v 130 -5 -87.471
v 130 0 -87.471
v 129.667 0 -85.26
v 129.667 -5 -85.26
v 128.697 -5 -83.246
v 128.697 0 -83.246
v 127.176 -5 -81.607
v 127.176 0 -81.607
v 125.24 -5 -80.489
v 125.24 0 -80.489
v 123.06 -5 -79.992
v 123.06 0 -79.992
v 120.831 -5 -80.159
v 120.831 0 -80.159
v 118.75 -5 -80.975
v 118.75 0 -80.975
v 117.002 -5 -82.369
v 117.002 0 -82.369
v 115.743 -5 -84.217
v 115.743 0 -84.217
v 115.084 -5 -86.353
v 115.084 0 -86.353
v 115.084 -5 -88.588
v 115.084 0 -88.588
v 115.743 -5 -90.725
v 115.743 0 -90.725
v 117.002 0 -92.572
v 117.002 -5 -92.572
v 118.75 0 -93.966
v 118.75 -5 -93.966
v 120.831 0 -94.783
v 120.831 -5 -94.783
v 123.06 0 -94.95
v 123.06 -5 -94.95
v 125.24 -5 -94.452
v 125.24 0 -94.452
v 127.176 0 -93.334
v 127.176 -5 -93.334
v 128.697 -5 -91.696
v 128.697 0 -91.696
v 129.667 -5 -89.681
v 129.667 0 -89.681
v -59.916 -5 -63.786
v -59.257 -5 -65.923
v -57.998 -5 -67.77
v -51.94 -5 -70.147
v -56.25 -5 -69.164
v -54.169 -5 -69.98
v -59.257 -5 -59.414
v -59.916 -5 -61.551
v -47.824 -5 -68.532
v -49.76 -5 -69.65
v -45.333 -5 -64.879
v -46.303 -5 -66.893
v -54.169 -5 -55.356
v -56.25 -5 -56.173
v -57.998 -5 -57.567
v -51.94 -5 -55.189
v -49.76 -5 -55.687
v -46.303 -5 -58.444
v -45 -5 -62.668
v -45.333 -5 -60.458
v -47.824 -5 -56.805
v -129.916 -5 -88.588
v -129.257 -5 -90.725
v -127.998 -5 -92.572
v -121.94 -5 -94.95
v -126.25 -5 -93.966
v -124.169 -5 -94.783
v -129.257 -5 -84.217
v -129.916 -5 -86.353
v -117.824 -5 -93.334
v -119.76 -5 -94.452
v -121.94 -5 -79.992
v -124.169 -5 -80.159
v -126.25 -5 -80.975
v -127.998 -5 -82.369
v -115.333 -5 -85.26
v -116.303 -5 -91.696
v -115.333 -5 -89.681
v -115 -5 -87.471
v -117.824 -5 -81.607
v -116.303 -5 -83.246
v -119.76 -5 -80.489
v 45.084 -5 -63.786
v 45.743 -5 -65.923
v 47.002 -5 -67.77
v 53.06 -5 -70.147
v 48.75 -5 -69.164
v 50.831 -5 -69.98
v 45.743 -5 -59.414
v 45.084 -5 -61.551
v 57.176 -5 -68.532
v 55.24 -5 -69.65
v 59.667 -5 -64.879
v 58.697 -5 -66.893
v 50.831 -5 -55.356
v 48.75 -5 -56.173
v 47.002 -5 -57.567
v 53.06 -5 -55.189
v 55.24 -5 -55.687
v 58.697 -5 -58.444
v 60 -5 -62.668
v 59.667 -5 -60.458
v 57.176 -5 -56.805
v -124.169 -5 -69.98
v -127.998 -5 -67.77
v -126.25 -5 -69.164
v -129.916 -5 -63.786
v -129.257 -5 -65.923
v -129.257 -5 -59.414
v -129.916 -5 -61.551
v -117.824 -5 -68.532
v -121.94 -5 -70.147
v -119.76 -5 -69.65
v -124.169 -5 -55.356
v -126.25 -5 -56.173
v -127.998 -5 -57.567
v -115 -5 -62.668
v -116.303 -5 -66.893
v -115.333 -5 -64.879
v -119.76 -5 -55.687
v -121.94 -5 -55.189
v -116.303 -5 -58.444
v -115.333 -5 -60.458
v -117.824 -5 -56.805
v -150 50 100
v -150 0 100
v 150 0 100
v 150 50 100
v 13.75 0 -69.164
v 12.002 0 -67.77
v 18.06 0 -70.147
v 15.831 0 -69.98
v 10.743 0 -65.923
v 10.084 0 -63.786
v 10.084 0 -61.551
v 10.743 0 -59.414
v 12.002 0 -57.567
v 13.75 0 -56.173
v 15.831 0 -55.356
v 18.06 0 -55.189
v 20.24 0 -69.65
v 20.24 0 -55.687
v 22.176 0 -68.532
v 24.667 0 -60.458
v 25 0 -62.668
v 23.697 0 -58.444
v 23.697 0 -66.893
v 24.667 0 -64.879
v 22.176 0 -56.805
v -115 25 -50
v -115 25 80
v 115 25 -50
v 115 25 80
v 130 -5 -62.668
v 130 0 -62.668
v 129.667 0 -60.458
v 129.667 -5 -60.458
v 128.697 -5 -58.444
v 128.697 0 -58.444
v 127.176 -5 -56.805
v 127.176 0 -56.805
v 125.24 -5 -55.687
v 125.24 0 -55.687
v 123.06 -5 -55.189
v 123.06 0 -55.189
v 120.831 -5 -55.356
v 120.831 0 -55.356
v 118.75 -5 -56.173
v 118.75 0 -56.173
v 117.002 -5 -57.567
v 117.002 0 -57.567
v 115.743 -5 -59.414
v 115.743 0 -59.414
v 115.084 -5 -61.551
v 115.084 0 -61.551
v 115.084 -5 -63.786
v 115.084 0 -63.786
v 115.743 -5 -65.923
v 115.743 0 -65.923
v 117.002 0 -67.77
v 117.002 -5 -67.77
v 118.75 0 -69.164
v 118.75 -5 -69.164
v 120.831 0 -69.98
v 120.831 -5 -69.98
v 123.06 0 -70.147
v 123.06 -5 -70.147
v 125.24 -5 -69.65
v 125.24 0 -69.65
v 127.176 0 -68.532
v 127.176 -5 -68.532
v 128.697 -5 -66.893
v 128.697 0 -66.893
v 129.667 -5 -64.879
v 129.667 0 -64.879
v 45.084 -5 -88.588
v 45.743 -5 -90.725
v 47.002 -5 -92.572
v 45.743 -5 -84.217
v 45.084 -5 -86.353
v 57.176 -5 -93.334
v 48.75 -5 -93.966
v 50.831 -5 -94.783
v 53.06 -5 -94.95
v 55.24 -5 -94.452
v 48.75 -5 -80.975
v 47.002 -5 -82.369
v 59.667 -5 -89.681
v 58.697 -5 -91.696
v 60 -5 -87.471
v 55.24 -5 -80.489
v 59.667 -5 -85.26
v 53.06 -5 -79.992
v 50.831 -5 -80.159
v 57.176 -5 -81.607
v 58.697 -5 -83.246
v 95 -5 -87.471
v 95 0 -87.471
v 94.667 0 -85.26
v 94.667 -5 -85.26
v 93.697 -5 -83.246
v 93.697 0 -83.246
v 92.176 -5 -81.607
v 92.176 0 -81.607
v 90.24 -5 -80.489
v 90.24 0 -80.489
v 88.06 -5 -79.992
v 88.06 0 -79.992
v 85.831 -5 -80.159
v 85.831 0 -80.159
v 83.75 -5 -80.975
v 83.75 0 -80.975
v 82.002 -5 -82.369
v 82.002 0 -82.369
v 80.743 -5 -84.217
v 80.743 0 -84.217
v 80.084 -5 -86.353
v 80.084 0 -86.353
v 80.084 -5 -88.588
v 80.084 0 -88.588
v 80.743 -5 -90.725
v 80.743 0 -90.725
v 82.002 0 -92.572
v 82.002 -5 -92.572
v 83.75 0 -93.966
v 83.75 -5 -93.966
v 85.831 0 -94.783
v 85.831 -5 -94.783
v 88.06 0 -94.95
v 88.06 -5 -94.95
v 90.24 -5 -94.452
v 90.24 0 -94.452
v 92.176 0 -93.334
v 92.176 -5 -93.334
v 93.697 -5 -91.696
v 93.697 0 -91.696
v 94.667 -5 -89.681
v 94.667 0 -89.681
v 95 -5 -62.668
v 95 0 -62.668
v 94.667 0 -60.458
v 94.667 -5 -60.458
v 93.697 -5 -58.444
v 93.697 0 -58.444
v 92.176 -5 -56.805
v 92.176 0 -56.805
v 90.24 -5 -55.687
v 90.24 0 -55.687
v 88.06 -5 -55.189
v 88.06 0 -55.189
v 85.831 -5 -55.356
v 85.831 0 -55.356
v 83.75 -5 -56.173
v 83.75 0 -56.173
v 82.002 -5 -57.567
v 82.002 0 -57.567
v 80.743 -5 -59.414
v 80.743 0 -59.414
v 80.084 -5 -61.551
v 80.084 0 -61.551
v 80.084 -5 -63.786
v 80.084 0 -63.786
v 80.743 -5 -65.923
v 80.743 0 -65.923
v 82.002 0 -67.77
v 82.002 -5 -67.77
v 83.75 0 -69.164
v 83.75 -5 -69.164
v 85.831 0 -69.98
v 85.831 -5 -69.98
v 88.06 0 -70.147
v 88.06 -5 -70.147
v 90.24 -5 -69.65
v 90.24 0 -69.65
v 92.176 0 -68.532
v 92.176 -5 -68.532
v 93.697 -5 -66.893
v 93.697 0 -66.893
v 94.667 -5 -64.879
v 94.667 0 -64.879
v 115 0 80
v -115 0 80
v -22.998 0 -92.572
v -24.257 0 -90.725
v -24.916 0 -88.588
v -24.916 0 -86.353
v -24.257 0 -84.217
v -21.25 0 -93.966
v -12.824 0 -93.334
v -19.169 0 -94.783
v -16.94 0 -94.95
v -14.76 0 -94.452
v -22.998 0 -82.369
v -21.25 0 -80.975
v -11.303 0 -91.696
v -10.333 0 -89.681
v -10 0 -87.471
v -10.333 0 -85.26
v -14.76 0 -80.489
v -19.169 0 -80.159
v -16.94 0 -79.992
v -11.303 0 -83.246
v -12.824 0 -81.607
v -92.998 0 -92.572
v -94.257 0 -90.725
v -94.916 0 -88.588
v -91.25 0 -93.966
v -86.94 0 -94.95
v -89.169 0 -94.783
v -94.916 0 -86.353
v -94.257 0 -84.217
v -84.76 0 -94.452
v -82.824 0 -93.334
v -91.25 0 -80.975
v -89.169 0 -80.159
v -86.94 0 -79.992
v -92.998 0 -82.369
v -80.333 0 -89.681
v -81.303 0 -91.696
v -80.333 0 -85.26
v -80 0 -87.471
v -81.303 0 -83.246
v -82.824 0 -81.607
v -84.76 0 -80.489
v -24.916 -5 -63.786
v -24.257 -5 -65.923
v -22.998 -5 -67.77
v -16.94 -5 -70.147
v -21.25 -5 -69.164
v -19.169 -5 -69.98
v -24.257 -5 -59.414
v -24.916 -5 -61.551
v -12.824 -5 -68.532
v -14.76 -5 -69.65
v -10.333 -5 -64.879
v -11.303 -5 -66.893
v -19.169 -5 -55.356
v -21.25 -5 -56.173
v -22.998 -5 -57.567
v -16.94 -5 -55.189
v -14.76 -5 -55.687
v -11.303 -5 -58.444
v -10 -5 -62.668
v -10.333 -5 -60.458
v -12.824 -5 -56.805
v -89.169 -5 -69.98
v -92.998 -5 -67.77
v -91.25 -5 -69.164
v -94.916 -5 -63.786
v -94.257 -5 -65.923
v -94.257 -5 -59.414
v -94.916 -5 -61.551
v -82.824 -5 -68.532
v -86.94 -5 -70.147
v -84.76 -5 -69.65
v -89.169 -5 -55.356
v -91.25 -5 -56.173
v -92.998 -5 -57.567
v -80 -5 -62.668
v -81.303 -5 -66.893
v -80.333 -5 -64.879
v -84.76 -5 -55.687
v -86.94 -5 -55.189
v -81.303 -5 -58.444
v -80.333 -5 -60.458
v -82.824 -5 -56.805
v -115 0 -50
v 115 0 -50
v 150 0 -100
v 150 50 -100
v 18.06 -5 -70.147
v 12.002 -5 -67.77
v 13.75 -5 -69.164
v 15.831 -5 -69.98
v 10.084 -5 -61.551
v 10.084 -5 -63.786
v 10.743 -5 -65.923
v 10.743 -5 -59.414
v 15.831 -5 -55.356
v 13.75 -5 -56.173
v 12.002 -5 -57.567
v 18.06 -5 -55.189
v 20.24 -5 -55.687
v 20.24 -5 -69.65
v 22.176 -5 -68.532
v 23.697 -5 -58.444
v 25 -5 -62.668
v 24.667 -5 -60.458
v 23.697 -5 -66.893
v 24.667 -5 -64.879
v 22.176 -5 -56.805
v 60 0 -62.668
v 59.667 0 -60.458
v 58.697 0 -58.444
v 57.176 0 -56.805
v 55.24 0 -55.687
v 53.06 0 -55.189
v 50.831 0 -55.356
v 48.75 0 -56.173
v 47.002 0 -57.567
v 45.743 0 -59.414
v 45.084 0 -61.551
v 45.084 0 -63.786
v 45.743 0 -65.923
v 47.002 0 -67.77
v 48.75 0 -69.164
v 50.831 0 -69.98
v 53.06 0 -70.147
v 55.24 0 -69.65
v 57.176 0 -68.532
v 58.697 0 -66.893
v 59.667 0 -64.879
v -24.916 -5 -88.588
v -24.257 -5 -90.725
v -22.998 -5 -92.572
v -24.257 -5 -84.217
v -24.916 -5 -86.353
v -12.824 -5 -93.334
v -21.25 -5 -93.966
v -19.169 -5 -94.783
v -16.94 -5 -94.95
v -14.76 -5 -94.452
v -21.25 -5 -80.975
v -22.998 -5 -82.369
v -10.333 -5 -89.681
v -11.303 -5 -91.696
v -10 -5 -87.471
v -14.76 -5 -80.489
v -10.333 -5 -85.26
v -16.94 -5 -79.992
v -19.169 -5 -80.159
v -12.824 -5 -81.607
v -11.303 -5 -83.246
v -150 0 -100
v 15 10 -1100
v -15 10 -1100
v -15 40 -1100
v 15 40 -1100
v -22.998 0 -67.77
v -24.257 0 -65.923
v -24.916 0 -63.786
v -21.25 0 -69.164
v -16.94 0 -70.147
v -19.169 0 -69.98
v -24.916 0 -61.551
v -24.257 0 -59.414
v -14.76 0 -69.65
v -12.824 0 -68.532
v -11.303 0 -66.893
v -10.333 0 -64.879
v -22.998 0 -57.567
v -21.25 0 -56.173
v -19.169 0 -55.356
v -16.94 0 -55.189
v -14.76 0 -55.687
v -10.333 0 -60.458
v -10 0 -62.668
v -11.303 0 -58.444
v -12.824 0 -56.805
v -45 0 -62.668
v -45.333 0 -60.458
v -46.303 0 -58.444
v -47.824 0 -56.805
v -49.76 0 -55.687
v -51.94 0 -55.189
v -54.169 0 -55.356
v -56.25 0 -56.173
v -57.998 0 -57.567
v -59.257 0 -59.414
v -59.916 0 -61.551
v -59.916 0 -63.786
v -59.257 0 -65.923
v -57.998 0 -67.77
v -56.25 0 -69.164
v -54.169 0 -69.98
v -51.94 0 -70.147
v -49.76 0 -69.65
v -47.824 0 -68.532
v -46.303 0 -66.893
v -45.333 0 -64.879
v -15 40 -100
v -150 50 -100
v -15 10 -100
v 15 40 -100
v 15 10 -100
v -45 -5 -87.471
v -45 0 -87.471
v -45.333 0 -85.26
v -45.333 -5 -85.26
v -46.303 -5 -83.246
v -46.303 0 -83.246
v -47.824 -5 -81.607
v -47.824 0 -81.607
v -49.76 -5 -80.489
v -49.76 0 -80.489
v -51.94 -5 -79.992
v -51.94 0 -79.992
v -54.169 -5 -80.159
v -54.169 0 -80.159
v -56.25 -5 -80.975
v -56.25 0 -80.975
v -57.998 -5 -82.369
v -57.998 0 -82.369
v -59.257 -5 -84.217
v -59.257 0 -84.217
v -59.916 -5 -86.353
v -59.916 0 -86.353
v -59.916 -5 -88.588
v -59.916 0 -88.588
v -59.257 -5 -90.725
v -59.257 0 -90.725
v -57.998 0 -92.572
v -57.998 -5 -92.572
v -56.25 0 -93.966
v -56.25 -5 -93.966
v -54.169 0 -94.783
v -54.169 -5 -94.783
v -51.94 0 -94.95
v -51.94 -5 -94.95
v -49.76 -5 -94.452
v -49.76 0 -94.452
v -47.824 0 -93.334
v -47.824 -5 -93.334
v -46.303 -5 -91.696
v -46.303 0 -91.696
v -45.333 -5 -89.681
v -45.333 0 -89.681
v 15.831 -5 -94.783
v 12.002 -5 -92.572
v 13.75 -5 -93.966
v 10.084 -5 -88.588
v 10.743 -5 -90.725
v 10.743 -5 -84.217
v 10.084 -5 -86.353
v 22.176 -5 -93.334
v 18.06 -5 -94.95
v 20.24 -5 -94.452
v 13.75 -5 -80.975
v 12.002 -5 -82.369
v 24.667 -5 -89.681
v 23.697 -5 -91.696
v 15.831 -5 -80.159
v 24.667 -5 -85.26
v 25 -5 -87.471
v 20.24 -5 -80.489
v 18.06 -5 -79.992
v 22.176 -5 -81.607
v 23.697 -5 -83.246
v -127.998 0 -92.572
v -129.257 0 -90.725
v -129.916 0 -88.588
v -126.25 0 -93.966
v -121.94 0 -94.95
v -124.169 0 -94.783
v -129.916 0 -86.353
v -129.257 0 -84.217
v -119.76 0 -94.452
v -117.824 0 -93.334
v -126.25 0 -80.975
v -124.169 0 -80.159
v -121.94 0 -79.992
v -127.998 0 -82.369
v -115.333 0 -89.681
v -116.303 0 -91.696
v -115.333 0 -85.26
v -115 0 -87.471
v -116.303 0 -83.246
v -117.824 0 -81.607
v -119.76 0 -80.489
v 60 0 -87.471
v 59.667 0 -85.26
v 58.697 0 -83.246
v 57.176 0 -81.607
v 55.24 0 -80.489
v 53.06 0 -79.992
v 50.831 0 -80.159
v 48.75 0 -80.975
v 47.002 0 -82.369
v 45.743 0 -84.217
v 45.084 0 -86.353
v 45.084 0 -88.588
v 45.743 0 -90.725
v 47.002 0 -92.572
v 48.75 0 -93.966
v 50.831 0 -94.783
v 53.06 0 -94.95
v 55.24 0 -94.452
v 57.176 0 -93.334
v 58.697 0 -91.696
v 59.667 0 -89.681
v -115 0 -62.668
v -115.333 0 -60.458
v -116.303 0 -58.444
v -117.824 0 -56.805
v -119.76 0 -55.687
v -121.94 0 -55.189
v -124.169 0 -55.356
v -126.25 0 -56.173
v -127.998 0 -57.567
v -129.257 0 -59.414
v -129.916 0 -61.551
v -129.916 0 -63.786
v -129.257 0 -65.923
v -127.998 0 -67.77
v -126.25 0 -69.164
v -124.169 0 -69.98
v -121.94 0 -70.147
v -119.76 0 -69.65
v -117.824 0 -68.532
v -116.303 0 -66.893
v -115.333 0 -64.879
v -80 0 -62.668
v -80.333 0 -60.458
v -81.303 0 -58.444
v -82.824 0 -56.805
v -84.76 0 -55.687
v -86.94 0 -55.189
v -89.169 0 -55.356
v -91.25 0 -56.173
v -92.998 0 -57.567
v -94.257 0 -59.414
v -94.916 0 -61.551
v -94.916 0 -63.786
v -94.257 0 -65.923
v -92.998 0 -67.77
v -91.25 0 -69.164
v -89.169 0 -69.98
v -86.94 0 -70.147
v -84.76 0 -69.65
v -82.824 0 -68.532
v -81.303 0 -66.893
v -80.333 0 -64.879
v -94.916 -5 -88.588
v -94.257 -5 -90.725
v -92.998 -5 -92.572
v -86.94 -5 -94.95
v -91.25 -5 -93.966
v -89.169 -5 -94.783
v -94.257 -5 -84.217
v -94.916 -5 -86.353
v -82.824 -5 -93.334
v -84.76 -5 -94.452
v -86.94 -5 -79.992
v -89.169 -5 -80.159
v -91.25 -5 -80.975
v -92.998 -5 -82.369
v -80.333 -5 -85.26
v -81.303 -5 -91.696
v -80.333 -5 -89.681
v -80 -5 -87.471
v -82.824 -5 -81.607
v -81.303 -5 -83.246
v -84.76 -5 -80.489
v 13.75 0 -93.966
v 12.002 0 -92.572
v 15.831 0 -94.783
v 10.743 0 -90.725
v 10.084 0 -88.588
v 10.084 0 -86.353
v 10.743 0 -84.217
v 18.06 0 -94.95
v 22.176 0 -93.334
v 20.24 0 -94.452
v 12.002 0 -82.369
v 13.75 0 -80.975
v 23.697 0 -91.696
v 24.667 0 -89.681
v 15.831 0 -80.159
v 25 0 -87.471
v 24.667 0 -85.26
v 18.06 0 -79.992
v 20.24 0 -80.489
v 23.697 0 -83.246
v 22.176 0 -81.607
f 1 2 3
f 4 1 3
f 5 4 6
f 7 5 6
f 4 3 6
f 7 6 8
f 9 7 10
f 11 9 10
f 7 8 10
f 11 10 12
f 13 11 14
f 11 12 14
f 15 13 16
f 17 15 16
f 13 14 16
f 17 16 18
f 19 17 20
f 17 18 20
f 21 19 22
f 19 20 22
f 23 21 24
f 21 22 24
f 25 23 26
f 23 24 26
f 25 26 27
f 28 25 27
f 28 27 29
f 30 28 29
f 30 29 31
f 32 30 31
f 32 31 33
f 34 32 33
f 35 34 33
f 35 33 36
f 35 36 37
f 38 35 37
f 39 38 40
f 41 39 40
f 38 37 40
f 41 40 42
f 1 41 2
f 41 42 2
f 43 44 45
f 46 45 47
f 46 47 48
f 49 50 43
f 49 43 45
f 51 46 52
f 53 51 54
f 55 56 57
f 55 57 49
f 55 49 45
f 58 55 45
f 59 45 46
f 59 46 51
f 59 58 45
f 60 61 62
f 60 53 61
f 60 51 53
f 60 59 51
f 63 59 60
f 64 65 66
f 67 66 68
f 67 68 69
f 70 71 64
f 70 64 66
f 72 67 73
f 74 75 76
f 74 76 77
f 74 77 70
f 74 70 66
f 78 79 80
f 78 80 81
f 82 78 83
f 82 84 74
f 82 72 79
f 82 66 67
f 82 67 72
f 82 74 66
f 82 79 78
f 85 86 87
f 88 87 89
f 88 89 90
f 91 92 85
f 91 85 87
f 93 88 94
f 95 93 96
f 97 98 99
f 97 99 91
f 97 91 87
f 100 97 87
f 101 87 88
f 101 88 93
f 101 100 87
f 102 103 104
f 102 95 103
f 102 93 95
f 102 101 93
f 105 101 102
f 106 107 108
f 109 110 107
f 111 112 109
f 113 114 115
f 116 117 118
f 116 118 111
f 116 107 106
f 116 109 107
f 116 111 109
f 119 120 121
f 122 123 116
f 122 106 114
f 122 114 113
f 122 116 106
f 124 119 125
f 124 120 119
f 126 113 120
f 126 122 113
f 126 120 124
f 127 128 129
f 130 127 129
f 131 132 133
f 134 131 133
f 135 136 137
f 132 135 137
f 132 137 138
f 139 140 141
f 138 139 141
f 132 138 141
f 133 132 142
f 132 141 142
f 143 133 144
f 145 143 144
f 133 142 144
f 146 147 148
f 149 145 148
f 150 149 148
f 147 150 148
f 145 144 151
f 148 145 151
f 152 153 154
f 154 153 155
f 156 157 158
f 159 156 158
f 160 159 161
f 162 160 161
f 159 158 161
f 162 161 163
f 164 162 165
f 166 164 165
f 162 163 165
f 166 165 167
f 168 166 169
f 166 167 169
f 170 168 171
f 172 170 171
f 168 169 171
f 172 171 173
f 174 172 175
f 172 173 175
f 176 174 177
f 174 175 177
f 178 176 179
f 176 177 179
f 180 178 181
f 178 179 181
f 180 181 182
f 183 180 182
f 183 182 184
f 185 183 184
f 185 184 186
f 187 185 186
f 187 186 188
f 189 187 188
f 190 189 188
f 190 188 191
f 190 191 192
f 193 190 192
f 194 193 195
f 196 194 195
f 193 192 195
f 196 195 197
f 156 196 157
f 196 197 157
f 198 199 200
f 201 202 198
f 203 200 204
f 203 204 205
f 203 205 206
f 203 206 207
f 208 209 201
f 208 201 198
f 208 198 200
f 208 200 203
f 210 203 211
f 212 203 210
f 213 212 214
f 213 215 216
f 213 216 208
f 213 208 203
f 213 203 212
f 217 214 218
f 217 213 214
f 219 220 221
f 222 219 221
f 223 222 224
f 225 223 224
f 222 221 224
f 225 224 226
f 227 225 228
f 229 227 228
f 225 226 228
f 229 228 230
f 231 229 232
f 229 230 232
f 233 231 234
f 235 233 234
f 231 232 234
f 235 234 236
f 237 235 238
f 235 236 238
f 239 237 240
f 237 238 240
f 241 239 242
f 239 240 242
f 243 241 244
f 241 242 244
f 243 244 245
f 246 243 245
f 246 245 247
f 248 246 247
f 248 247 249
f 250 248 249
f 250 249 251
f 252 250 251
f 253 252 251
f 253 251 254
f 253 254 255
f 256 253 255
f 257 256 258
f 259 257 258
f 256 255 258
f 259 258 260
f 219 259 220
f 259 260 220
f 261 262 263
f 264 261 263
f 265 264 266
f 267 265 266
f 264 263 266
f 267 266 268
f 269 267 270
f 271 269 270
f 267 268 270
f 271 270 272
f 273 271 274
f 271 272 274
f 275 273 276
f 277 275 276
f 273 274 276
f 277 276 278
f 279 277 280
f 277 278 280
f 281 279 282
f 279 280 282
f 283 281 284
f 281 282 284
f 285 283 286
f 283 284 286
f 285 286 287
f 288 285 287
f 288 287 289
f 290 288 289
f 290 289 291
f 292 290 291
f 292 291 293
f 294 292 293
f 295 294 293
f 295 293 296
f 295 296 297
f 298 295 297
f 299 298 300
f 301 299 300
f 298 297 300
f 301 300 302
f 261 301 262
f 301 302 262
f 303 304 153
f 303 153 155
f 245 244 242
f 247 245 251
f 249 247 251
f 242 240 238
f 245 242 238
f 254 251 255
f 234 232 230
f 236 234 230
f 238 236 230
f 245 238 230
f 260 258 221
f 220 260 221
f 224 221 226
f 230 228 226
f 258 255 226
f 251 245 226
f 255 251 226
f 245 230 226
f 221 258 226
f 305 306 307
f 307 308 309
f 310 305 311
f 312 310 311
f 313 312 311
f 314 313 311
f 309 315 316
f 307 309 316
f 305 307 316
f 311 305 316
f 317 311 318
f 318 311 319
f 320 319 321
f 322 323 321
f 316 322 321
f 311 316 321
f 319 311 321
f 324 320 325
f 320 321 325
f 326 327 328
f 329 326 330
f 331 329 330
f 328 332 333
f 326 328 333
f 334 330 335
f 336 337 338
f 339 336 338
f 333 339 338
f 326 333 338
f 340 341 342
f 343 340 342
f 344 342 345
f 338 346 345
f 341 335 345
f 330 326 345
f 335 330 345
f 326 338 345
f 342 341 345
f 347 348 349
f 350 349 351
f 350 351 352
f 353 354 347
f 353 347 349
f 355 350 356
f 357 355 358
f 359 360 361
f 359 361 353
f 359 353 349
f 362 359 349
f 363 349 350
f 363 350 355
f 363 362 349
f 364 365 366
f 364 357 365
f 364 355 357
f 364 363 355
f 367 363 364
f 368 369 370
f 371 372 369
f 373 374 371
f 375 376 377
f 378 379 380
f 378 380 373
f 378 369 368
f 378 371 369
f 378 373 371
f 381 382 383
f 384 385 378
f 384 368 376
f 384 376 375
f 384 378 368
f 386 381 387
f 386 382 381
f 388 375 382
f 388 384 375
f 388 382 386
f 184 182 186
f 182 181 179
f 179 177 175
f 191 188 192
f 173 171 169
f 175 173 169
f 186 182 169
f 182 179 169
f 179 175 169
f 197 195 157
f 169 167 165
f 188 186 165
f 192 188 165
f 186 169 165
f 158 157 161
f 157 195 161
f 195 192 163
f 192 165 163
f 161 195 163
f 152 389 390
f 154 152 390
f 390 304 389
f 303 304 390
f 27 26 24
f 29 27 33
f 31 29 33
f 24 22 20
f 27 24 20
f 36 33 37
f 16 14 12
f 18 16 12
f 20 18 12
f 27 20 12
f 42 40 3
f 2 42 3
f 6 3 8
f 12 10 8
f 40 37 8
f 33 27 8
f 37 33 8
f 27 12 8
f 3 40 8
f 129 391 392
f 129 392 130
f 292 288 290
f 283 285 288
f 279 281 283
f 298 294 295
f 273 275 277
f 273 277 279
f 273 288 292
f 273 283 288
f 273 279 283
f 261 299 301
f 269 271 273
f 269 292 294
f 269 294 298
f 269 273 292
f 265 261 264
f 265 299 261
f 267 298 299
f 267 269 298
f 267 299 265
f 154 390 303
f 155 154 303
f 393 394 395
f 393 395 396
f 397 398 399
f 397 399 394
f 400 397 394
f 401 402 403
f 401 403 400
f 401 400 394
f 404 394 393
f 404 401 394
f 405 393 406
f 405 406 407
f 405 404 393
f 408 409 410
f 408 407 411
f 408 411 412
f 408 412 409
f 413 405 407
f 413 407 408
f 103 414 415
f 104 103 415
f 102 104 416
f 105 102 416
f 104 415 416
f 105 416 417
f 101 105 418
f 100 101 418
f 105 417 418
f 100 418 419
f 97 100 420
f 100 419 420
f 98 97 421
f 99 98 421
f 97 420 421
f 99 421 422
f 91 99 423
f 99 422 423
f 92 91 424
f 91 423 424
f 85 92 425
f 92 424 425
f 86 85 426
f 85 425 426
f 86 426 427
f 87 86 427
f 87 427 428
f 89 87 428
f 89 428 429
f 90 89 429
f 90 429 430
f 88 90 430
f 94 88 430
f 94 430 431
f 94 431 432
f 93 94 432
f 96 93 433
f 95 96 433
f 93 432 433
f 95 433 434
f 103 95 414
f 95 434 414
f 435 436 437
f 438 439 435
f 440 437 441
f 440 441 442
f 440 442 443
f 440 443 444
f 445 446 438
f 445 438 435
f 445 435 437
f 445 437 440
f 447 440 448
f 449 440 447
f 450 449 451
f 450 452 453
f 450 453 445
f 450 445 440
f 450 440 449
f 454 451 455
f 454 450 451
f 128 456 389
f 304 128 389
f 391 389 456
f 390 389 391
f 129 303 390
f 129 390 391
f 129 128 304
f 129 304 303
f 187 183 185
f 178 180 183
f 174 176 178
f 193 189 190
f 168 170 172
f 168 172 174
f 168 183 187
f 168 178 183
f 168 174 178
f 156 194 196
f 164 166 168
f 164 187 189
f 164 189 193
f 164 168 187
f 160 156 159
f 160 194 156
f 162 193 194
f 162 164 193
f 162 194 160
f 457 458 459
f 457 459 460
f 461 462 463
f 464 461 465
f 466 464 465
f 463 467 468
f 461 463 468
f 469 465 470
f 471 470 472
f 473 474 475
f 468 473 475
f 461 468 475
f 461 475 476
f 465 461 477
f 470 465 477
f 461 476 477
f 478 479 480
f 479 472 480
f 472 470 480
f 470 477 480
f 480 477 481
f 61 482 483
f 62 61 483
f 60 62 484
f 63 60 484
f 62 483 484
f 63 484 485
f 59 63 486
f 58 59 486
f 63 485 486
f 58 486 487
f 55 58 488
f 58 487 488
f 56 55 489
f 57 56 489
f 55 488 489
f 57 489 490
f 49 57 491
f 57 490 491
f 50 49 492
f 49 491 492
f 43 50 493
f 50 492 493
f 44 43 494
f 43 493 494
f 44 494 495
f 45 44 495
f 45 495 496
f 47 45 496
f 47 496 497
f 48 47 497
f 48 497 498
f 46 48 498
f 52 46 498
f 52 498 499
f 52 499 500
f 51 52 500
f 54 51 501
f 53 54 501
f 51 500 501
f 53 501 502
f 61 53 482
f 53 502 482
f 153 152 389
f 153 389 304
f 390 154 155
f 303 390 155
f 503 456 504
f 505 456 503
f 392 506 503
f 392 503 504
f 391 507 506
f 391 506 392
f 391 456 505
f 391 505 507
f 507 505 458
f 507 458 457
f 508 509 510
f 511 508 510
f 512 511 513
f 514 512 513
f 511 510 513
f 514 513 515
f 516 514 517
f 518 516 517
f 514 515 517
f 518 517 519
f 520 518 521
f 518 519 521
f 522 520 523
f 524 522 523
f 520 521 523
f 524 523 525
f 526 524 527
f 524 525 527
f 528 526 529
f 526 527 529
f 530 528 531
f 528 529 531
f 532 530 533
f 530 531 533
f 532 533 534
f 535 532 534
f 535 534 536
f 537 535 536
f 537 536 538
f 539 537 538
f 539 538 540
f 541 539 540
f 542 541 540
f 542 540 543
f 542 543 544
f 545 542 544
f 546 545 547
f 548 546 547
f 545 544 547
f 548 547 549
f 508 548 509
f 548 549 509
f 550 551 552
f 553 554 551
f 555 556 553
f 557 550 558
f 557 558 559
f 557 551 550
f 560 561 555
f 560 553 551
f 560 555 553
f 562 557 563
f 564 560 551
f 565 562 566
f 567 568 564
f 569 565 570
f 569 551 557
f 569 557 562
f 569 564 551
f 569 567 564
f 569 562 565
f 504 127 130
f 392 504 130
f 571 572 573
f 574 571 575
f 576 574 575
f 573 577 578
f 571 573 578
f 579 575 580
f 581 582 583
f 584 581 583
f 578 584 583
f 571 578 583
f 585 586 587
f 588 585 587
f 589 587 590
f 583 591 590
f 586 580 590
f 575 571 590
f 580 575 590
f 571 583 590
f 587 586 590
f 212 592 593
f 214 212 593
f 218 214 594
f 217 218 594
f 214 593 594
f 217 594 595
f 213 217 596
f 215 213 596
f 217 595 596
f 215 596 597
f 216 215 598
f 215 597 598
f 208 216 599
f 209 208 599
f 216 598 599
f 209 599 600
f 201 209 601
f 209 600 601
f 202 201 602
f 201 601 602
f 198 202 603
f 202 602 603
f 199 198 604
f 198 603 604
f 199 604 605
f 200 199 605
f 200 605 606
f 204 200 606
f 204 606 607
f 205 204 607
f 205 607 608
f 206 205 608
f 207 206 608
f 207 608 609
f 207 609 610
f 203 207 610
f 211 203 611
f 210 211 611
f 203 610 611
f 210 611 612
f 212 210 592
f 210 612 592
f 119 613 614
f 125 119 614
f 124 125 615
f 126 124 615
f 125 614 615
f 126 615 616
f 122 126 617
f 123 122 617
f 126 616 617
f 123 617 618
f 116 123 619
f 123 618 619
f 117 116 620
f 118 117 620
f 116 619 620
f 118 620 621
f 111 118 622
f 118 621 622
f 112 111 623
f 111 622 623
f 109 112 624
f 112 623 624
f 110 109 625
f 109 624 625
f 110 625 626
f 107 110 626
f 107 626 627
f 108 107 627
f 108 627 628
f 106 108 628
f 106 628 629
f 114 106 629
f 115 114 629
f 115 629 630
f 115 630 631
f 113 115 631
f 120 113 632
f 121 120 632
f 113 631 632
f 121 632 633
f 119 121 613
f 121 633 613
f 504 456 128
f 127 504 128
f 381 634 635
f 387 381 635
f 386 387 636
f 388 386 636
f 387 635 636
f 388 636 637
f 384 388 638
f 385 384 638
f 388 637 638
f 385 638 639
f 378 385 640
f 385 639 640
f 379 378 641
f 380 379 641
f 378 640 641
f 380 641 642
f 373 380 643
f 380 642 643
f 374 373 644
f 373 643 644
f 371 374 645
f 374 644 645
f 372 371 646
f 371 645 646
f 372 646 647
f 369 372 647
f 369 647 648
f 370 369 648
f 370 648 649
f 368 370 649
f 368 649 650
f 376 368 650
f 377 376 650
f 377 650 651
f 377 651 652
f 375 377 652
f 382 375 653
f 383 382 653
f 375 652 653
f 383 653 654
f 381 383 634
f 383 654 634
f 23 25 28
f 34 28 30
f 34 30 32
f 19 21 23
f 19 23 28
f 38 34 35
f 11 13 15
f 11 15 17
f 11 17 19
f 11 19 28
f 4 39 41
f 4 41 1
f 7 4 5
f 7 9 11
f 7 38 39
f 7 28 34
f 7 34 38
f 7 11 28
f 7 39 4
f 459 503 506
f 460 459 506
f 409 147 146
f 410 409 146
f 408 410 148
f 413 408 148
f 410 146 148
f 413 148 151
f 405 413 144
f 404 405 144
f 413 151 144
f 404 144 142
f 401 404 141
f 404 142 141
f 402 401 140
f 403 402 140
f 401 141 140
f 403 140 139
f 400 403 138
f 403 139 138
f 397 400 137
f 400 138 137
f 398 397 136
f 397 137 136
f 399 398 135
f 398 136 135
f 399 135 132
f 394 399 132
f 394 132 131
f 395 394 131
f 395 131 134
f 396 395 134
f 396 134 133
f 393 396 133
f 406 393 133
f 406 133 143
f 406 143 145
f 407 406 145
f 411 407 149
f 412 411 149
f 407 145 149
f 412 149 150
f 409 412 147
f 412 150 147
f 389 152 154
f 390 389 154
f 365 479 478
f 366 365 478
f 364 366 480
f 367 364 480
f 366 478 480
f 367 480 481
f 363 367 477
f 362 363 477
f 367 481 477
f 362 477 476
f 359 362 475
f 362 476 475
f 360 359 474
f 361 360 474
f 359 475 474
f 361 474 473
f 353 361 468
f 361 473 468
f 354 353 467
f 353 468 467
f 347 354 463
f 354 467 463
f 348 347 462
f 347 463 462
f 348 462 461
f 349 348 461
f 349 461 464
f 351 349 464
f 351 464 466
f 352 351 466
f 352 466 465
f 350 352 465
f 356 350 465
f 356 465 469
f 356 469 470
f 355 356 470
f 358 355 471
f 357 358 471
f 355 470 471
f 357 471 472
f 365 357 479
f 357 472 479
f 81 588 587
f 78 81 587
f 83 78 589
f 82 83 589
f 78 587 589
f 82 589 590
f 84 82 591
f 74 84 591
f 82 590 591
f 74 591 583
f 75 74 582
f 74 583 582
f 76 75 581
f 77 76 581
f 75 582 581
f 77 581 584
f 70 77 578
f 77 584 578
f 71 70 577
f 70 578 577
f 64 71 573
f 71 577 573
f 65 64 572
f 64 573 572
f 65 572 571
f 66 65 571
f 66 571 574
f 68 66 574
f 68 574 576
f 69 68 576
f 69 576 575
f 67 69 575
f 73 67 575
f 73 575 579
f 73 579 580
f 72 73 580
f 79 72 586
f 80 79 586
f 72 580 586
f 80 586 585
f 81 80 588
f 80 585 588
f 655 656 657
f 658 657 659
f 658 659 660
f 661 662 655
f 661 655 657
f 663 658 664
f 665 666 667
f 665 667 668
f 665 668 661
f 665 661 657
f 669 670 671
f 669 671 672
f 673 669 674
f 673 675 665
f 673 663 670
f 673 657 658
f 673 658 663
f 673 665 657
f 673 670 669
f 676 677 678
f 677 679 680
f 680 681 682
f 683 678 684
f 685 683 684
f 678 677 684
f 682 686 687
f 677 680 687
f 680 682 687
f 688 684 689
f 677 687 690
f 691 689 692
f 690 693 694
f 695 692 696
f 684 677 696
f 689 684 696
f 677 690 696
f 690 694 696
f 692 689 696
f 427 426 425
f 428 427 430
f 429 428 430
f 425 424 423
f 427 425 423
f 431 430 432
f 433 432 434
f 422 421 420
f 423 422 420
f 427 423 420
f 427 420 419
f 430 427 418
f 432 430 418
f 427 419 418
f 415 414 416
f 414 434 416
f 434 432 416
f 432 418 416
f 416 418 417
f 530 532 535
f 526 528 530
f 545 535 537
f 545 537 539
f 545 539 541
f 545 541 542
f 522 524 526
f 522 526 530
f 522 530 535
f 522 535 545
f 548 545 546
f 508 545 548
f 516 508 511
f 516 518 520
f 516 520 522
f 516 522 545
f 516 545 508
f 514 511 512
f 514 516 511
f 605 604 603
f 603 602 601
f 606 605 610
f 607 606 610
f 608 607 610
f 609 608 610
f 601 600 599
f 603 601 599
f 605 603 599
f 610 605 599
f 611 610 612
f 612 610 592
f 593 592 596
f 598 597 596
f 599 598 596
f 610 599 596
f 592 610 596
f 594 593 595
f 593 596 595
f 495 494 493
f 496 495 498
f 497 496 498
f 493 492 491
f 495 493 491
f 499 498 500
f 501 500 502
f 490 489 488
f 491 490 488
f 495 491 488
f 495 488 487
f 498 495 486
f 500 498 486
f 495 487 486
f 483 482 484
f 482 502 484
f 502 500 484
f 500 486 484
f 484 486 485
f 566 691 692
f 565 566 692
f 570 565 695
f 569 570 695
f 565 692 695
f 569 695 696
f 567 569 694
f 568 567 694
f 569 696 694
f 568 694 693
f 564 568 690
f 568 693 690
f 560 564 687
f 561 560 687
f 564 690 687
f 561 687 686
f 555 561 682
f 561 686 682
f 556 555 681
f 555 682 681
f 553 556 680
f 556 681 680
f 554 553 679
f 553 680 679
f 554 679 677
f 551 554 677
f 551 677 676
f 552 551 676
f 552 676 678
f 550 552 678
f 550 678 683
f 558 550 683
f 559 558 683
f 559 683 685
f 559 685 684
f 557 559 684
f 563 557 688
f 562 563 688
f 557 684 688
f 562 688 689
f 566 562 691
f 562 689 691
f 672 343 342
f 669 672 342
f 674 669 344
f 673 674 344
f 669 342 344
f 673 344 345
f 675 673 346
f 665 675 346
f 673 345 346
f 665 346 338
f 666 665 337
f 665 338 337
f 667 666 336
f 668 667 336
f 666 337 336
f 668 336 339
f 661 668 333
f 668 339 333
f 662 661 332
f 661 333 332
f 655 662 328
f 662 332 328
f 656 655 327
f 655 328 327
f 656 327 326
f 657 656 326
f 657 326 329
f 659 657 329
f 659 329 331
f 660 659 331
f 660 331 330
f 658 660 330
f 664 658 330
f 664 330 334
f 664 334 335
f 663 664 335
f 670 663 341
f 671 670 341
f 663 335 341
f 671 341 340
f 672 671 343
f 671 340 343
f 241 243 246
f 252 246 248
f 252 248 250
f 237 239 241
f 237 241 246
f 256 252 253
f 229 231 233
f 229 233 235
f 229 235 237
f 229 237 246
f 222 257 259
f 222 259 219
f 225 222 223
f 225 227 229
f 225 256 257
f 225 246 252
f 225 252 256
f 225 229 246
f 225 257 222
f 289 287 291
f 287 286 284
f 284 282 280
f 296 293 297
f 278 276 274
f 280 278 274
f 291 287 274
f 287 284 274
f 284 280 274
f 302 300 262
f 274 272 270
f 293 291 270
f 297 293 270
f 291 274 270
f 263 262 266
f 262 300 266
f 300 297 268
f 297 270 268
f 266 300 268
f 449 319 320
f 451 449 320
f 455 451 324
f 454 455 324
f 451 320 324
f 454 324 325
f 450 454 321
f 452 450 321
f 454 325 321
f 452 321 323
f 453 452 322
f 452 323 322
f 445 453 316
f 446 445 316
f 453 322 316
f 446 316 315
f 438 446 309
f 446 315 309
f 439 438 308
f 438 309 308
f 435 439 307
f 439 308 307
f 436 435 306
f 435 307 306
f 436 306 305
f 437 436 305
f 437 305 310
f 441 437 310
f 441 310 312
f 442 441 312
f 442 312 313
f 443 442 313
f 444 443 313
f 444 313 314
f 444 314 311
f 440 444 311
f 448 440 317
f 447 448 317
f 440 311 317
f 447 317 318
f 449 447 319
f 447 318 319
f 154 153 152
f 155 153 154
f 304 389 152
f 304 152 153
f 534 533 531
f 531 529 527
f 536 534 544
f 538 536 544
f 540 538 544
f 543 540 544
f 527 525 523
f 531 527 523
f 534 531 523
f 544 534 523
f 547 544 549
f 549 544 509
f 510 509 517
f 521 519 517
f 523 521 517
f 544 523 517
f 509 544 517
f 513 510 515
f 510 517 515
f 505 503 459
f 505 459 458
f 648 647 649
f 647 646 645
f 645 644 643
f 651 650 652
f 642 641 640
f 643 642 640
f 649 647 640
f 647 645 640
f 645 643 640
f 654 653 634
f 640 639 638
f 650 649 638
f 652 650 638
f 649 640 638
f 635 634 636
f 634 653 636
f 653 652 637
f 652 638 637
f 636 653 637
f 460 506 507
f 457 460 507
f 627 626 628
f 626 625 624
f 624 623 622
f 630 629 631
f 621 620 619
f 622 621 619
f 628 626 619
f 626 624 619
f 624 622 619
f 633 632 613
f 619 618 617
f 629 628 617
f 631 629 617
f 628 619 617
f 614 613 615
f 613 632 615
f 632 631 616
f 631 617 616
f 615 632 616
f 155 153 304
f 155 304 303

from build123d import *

# Parameters (mm, degrees)
F0_W     = 300
F0_H     = 200
F1_DEPTH = 50
F2_W     = 230
F2_H     = 130
F3_DEPTH = 25
F4_W     = 230
F4_H     = 130
F5_DEPTH = 25
F6_R     = 7.5
F7_DEPTH = 5
F8_W     = 30
F8_H     = 30
F9_DEPTH = 1000


with BuildPart() as f1:
    # F0 (on Front) → F1 (new body)
    with BuildSketch(Plane.XZ):
        Rectangle(F0_W, F0_H)
    extrude(amount=-F1_DEPTH)

    # F2 (on face) → F3 (cut)
    with BuildSketch(Plane.XZ):
        with Locations((0, 15)):
            Rectangle(F2_W, F2_H)
    extrude(amount=-F3_DEPTH, mode=Mode.SUBTRACT)

    # F8 (on face) → F9 (join)
    with BuildSketch(Plane(origin=(0, 0, -100), x_dir=(1, 0, 0), z_dir=(0, 0, -1))):
        with Locations((0, -25)):
            Rectangle(F8_W, F8_H)
    extrude(amount=F9_DEPTH)


with BuildPart() as f5:
    # F4 (on face) → F5 (new body)
    with BuildSketch(Plane.XZ.offset(-25)):
        with Locations((0, 15)):
            Rectangle(F4_W, F4_H)
    extrude(amount=F5_DEPTH)


with BuildPart() as f7:
    # F6 (on face) → F7 (new body)
    with BuildSketch(Plane.XZ):
        with Locations((-122.5, -62.6684501767)):
            Circle(F6_R)
    extrude(amount=F7_DEPTH)


with BuildPart() as f7b:
    # F6 (on face) → F7, piece 2 (new body)
    with BuildSketch(Plane.XZ):
        with Locations((-122.5, -87.4706730247)):
            Circle(F6_R)
    extrude(amount=F7_DEPTH)


with BuildPart() as f7c:
    # F6 (on face) → F7, piece 3 (new body)
    with BuildSketch(Plane.XZ):
        with Locations((-87.5, -62.6684501767)):
            Circle(F6_R)
    extrude(amount=F7_DEPTH)


with BuildPart() as f7d:
    # F6 (on face) → F7, piece 4 (new body)
    with BuildSketch(Plane.XZ):
        with Locations((-87.5, -87.4706730247)):
            Circle(F6_R)
    extrude(amount=F7_DEPTH)


with BuildPart() as f7e:
    # F6 (on face) → F7, piece 5 (new body)
    with BuildSketch(Plane.XZ):
        with Locations((-52.5, -62.6684501767)):
            Circle(F6_R)
    extrude(amount=F7_DEPTH)


with BuildPart() as f7f:
    # F6 (on face) → F7, piece 6 (new body)
    with BuildSketch(Plane.XZ):
        with Locations((-52.5, -87.4706730247)):
            Circle(F6_R)
    extrude(amount=F7_DEPTH)


with BuildPart() as f7g:
    # F6 (on face) → F7, piece 7 (new body)
    with BuildSketch(Plane.XZ):
        with Locations((-17.5, -62.6684501767)):
            Circle(F6_R)
    extrude(amount=F7_DEPTH)


with BuildPart() as f7h:
    # F6 (on face) → F7, piece 8 (new body)
    with BuildSketch(Plane.XZ):
        with Locations((-17.5, -87.4706730247)):
            Circle(F6_R)
    extrude(amount=F7_DEPTH)


with BuildPart() as f7i:
    # F6 (on face) → F7, piece 9 (new body)
    with BuildSketch(Plane.XZ):
        with Locations((17.5, -62.6684501767)):
            Circle(F6_R)
    extrude(amount=F7_DEPTH)


with BuildPart() as f7j:
    # F6 (on face) → F7, piece 10 (new body)
    with BuildSketch(Plane.XZ):
        with Locations((17.5, -87.4706730247)):
            Circle(F6_R)
    extrude(amount=F7_DEPTH)


with BuildPart() as f7k:
    # F6 (on face) → F7, piece 11 (new body)
    with BuildSketch(Plane.XZ):
        with Locations((52.5, -62.6684501767)):
            Circle(F6_R)
    extrude(amount=F7_DEPTH)


with BuildPart() as f7l:
    # F6 (on face) → F7, piece 12 (new body)
    with BuildSketch(Plane.XZ):
        with Locations((52.5, -87.4706730247)):
            Circle(F6_R)
    extrude(amount=F7_DEPTH)


with BuildPart() as f7m:
    # F6 (on face) → F7, piece 13 (new body)
    with BuildSketch(Plane.XZ):
        with Locations((87.5, -62.6684501767)):
            Circle(F6_R)
    extrude(amount=F7_DEPTH)


with BuildPart() as f7n:
    # F6 (on face) → F7, piece 14 (new body)
    with BuildSketch(Plane.XZ):
        with Locations((87.5, -87.4706730247)):
            Circle(F6_R)
    extrude(amount=F7_DEPTH)


with BuildPart() as f7o:
    # F6 (on face) → F7, piece 15 (new body)
    with BuildSketch(Plane.XZ):
        with Locations((122.5, -62.6684501767)):
            Circle(F6_R)
    extrude(amount=F7_DEPTH)


with BuildPart() as f7p:
    # F6 (on face) → F7, piece 16 (new body)
    with BuildSketch(Plane.XZ):
        with Locations((122.5, -87.4706730247)):
            Circle(F6_R)
    extrude(amount=F7_DEPTH)


solid = Compound([f1.part, f5.part, f7.part, f7b.part, f7c.part, f7d.part, f7e.part, f7f.part, f7g.part, f7h.part, f7i.part, f7j.part, f7k.part, f7l.part, f7m.part, f7n.part, f7o.part, f7p.part])
